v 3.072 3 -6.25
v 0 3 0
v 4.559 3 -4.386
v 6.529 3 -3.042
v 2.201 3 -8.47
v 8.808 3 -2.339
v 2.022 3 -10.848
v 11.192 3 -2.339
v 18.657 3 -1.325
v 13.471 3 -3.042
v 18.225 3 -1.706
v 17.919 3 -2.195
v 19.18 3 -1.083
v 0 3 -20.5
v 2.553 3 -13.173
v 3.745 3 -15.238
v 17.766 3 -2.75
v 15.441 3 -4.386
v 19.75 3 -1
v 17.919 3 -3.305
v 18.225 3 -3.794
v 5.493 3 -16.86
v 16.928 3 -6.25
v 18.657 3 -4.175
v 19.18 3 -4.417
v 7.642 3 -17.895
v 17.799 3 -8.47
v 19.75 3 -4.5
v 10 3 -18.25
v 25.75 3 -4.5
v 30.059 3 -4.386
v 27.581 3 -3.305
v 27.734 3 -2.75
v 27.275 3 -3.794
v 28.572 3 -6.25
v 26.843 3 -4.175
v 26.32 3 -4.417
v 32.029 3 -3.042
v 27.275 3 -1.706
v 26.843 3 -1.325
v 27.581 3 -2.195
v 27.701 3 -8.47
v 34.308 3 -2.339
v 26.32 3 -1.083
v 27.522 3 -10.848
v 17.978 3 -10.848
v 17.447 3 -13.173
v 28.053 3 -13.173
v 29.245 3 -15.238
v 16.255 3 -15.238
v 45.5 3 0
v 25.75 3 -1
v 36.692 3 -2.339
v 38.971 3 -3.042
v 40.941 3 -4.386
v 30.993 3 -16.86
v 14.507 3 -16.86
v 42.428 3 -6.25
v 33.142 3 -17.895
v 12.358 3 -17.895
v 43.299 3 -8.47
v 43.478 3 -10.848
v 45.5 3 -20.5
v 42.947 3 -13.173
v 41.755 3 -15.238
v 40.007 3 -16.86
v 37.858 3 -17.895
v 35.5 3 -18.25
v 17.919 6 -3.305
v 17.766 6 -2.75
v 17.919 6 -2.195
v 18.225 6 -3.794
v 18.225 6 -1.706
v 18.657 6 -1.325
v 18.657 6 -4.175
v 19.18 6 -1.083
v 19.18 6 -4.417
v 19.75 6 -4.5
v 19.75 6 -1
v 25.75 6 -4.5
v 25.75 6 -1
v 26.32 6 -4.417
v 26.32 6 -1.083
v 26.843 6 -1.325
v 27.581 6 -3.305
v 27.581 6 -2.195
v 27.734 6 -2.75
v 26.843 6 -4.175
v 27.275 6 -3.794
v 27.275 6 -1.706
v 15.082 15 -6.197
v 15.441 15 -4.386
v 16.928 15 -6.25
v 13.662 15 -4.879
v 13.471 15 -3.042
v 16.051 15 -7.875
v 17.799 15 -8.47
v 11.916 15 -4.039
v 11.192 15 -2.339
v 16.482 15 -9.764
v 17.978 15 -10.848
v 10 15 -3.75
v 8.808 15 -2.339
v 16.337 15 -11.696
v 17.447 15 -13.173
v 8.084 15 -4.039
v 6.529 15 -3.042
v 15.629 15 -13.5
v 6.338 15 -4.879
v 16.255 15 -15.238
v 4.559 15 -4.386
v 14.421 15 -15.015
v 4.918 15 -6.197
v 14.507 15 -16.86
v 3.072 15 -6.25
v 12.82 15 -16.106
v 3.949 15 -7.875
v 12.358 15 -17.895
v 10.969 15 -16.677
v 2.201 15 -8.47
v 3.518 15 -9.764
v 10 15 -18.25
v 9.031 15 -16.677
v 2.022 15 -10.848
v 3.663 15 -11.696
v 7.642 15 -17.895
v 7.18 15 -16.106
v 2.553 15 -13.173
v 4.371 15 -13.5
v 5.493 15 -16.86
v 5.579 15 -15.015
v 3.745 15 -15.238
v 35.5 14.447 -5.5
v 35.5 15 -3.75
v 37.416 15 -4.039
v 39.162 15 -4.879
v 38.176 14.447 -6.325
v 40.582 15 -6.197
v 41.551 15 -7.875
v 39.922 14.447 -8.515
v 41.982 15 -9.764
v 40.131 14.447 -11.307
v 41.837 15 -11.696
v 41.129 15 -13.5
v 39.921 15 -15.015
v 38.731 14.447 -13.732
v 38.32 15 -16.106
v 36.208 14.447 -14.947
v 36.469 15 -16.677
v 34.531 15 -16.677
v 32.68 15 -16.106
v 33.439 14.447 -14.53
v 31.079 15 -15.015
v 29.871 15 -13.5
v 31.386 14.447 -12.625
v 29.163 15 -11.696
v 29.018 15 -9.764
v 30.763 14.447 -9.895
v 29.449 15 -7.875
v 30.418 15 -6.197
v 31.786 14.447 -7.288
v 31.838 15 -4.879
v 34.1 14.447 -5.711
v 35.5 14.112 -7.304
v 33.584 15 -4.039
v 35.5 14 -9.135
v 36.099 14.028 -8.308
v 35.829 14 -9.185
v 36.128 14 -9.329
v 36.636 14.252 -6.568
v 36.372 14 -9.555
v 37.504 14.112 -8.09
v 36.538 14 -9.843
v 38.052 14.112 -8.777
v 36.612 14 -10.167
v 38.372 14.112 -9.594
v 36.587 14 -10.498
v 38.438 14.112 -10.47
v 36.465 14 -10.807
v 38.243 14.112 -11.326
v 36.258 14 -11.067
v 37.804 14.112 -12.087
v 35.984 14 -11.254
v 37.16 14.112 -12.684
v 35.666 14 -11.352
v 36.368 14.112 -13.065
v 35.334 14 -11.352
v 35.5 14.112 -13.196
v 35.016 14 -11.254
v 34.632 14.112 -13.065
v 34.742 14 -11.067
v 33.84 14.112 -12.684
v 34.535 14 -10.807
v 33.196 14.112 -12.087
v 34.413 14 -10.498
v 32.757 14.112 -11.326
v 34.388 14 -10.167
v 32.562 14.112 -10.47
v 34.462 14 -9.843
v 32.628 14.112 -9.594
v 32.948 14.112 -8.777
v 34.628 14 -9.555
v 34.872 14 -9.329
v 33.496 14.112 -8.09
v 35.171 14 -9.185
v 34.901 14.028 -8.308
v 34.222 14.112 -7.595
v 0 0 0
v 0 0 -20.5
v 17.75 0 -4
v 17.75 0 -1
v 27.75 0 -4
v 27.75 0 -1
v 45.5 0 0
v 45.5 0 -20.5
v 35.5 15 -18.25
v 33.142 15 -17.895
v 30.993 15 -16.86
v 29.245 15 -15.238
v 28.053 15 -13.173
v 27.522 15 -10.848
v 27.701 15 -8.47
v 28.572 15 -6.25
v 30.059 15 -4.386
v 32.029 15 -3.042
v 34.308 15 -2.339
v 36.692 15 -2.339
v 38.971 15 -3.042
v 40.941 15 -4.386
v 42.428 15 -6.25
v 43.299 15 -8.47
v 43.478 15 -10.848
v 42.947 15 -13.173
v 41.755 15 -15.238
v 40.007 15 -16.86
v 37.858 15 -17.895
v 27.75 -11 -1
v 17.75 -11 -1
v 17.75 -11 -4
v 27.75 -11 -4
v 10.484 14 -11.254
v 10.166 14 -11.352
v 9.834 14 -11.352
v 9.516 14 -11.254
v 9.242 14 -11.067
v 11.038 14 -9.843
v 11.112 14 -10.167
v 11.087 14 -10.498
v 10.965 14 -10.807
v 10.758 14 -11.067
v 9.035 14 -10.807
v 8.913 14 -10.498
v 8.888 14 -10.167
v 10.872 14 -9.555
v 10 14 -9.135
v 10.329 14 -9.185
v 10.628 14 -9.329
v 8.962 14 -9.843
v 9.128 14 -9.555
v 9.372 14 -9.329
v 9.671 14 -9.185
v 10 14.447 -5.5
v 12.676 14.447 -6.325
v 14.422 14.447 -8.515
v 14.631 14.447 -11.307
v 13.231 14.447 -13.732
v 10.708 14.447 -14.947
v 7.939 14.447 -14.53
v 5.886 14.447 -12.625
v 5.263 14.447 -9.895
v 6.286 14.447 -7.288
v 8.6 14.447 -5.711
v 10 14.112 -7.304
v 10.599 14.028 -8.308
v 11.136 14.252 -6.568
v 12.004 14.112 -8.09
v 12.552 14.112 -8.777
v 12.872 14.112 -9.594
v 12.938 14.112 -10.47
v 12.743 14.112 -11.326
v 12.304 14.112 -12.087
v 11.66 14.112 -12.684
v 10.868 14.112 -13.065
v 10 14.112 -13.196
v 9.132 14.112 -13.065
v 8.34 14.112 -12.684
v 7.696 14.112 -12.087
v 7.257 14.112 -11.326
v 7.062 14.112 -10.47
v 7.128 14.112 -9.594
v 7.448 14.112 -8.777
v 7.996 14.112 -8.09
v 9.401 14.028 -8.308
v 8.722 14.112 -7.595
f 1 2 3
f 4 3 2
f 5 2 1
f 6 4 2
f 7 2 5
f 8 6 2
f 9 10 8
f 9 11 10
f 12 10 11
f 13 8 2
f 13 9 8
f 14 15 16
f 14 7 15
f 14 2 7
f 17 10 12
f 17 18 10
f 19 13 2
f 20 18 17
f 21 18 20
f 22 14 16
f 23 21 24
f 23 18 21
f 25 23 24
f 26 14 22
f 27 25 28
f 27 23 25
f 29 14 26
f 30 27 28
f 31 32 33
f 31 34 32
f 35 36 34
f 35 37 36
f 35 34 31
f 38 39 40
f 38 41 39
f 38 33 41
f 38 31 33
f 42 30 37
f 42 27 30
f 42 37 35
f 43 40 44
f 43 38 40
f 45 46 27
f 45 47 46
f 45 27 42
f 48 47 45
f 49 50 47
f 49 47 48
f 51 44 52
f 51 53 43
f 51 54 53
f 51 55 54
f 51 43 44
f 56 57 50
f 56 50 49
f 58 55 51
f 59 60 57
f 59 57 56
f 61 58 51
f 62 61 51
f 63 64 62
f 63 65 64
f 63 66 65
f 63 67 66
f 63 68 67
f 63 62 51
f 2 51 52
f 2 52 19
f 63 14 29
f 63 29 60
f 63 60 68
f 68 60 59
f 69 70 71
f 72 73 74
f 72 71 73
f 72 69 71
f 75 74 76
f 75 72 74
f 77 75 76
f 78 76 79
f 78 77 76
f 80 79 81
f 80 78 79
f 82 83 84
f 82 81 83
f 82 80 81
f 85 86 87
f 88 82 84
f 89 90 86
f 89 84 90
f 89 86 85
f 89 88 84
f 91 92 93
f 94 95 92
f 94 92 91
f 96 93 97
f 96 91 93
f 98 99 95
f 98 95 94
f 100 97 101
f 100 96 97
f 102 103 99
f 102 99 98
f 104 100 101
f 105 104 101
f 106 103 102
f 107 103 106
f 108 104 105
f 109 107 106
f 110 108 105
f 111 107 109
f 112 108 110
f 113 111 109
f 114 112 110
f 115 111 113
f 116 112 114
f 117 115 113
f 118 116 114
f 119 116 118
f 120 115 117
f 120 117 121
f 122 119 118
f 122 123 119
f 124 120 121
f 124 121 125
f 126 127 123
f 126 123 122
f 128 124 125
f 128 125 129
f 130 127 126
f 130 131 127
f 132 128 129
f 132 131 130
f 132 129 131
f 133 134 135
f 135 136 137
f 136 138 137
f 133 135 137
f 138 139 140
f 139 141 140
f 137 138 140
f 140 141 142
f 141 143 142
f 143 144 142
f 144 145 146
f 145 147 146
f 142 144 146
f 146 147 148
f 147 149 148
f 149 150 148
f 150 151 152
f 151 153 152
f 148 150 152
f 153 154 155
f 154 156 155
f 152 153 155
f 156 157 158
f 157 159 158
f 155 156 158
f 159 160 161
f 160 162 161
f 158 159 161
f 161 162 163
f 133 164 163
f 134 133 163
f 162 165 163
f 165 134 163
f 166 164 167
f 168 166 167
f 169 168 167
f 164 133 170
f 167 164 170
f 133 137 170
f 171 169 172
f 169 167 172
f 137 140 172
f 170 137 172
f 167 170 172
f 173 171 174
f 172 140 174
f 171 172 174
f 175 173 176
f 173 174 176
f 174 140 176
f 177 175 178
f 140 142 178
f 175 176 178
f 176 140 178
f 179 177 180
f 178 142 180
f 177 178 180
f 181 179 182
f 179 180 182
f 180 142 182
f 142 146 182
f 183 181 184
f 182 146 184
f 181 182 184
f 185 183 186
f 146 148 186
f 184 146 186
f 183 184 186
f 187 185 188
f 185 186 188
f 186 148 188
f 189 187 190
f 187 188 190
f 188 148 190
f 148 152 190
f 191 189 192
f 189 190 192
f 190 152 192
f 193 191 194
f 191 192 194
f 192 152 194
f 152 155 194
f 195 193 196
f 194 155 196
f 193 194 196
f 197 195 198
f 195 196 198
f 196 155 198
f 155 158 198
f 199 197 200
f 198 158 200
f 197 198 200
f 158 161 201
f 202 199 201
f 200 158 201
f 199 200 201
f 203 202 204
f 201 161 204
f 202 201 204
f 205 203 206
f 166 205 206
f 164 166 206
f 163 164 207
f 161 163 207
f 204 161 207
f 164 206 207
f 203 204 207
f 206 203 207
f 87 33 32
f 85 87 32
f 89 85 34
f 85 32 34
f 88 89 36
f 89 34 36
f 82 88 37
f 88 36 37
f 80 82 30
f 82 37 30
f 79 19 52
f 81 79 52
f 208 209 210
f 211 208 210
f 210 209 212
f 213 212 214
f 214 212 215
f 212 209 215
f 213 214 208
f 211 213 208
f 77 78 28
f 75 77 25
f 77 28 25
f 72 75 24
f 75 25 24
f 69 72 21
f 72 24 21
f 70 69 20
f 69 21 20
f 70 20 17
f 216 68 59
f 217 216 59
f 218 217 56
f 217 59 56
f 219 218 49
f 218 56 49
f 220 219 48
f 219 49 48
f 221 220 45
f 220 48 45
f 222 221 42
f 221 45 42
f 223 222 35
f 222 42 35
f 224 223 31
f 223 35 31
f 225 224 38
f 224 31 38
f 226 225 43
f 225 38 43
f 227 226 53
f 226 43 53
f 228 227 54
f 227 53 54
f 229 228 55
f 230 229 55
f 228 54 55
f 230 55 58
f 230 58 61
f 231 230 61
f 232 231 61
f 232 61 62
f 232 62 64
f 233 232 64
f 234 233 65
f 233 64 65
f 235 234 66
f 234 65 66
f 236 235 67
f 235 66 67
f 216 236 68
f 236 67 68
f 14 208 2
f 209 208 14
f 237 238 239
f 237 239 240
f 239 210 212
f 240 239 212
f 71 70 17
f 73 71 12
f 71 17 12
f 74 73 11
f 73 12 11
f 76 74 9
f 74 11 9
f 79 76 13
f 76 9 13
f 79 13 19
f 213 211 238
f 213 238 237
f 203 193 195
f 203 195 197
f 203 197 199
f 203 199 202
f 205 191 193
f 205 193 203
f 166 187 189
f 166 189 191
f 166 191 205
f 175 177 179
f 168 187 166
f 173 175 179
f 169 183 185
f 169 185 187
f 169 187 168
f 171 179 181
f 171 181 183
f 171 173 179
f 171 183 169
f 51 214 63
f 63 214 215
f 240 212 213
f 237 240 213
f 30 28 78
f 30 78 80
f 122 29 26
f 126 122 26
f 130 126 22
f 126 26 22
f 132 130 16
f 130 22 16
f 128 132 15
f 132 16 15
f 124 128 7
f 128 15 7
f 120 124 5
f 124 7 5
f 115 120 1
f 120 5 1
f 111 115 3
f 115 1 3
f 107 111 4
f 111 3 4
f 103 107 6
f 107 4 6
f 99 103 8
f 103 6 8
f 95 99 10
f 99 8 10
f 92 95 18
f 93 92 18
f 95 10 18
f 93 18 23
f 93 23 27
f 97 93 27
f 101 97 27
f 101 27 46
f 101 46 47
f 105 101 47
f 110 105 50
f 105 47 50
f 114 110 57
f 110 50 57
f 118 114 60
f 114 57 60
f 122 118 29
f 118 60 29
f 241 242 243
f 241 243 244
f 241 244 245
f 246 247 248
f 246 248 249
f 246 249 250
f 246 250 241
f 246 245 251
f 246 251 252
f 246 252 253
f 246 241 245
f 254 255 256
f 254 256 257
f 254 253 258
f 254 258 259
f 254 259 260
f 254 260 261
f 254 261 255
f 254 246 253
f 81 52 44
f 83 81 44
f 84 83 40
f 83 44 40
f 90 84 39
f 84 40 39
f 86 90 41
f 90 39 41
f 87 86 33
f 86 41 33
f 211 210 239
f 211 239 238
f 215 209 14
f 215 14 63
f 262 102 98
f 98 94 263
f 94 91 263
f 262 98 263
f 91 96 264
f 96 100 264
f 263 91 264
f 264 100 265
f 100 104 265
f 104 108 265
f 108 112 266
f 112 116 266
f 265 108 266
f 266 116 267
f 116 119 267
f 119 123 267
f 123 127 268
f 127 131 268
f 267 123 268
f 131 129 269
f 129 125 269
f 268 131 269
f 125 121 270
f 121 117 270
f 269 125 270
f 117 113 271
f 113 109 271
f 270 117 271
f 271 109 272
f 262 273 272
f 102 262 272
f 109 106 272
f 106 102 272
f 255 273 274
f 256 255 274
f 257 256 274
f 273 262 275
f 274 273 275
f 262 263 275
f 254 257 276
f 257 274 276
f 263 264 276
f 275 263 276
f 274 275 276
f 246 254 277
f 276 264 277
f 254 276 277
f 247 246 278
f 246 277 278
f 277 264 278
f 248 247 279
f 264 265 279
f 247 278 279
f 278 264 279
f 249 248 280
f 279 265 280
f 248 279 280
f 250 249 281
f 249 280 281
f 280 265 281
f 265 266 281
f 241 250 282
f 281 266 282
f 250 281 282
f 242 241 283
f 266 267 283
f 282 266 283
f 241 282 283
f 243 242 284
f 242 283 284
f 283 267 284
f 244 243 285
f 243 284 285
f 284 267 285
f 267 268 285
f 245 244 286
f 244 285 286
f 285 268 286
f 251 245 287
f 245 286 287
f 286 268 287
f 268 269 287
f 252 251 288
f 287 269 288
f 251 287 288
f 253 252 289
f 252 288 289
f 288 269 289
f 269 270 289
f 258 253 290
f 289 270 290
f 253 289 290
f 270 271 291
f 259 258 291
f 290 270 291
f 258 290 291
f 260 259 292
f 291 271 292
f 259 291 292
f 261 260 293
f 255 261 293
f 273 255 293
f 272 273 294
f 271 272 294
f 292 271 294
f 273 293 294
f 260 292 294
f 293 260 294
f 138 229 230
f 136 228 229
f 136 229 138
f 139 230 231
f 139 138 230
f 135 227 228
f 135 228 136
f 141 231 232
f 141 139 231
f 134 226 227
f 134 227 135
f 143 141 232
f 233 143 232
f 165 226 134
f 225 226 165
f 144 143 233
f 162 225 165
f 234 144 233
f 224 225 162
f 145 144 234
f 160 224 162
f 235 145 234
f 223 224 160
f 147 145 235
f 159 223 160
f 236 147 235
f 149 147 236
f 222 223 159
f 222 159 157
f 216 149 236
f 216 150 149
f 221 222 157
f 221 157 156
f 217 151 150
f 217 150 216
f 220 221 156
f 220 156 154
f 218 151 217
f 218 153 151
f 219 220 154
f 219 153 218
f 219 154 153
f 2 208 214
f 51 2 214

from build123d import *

# Parameters (mm, degrees)
SKETCH1_W           = 45.5
SKETCH1_H           = 20.5
BOSS_EXTRUDE1_DEPTH = 3
SKETCH2_R           = 8
BOSS_EXTRUDE2_DEPTH = 12
SKETCH3_W           = 10
SKETCH3_H           = 3
BOSS_EXTRUDE3_DEPTH = 11
SKETCH4_R           = 6.5
CUT_EXTRUDE1_DEPTH  = 1
FILLET1_R           = 15
SKETCH5_W           = 10
SKETCH5_H           = 3.5
BOSS_EXTRUDE4_DEPTH = 3
FILLET2_R           = 2


with BuildPart() as part:
    # Sketch1 → Boss-Extrude1 (new body)
    with BuildSketch(Plane(origin=(0, 0, 0), x_dir=(1, 0, 0), z_dir=(0, 1, 0))):
        with Locations((22.75, 10.25)):
            Rectangle(SKETCH1_W, SKETCH1_H)
    extrude(amount=BOSS_EXTRUDE1_DEPTH)

    # Sketch2 → Boss-Extrude2 (add)
    with BuildSketch(Plane(origin=(0, 3, 0), x_dir=(1, 0, 0), z_dir=(0, 1, 0))):
        with Locations(Location((10, 10.25, 0), (0, 0, 90))):
            Circle(SKETCH2_R)
        with Locations(Location((35.5, 10.25, 0), (0, 0, 90))):
            Circle(SKETCH2_R)
    extrude(amount=BOSS_EXTRUDE2_DEPTH)

    # Sketch3 → Boss-Extrude3 (add)
    with BuildSketch(Plane.XZ):
        with Locations((22.75, -2.5)):
            Rectangle(SKETCH3_W, SKETCH3_H)
    extrude(amount=BOSS_EXTRUDE3_DEPTH)

    # Sketch4 → Cut-Extrude1 (cut)
    with BuildSketch(Plane(origin=(0, 15, 0), x_dir=(1, 0, 0), z_dir=(0, 1, 0))):
        with Locations(Location((10, 10.25, 0), (0, 0, 270))):
            Circle(SKETCH4_R)
        with Locations(Location((35.5, 10.25, 0), (0, 0, 270))):
            Circle(SKETCH4_R)
    extrude(amount=-CUT_EXTRUDE1_DEPTH, mode=Mode.SUBTRACT)

    # Fillet1
    # the kernel refuses this fillet: 15 mm, written as the material it adds along each edge
    with BuildSketch(Plane(origin=(10, 14, -10.25), x_dir=(0, 0, 1), z_dir=(-1, 0, 0))) as fillet1_piece_1:
        with BuildLine():
            CenterArc((1.114835193, 15), FILLET1_R, 270, 21.039469781)
            Line((1.114835193, 0), (1.114835193, -0.3))
            Line((1.114835193, -0.3), (6.5, -0.3))
            Line((6.5, -0.3), (6.8, 0))
            ThreePointArc((6.8, 0), (6.8, 0.5), (6.607703296, 0.72))
            Line((6.607703296, 0.72), (6.5, 1))
        make_face()
    revolve(axis=Axis((10, 14, -10.25), (0, 1, 0)))
    with BuildSketch(Plane(origin=(35.5, 14, -10.25), x_dir=(0, 0, 1), z_dir=(-1, 0, 0))) as fillet1_piece_2:
        with BuildLine():
            CenterArc((1.114835193, 15), FILLET1_R, 270, 21.039469781)
            Line((1.114835193, 0), (1.114835193, -0.3))
            Line((1.114835193, -0.3), (6.5, -0.3))
            Line((6.5, -0.3), (6.8, 0))
            ThreePointArc((6.8, 0), (6.8, 0.5), (6.607703296, 0.72))
            Line((6.607703296, 0.72), (6.5, 1))
        make_face()
    revolve(axis=Axis((35.5, 14, -10.25), (0, 1, 0)))

    # Sketch5 → Boss-Extrude4 (add)
    with BuildSketch(Plane(origin=(0, 3, 0), x_dir=(1, 0, 0), z_dir=(0, 1, 0))):
        with Locations((22.75, 2.75)):
            Rectangle(SKETCH5_W, SKETCH5_H)
    extrude(amount=BOSS_EXTRUDE4_DEPTH)

    # Fillet2
    # the kernel refuses this fillet: 2 mm, written as the material it takes off along each edge
    with BuildSketch(Plane(origin=(17.75, 3, -1), x_dir=(0, 0, -1), z_dir=(0, 1, 0)), Plane(origin=(27.75, 3, -1), x_dir=(-1, 0, 0), z_dir=(0, 1, 0)), Plane(origin=(27.75, 3, -4.5), x_dir=(0, 0, 1), z_dir=(0, 1, 0))) as fillet2_piece_1:
        with BuildLine():
            CenterArc((FILLET2_R, -FILLET2_R), FILLET2_R, 90, 90)
            Line((0, -FILLET2_R), (0, 0))
            Line((0, 0), (FILLET2_R, 0))
        make_face()
    extrude(amount=8, mode=Mode.SUBTRACT)
    with BuildSketch(Plane(origin=(17.75, 3, -4.5), x_dir=(0, 0, 1), z_dir=(0, 1, 0))) as fillet2_piece_2:
        with BuildLine():
            CenterArc((FILLET2_R, FILLET2_R), FILLET2_R, 180, 90)
            Line((0, FILLET2_R), (0, 0))
            Line((0, 0), (FILLET2_R, 0))
        make_face()
    extrude(amount=8, mode=Mode.SUBTRACT)


solid = part.part
